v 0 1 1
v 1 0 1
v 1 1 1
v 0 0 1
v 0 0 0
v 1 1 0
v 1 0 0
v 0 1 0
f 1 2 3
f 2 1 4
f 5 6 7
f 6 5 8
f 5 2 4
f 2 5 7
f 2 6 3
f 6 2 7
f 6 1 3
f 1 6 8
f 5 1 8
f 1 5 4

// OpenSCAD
cube(1);

// translate([0.5, 0, 0]) {
//     cube(1);
// }

// translate([1, 0, 0]) {
//     cube(1);
// }

// translate([1.5, 0, 0]) {
//     cube(1);
// }
